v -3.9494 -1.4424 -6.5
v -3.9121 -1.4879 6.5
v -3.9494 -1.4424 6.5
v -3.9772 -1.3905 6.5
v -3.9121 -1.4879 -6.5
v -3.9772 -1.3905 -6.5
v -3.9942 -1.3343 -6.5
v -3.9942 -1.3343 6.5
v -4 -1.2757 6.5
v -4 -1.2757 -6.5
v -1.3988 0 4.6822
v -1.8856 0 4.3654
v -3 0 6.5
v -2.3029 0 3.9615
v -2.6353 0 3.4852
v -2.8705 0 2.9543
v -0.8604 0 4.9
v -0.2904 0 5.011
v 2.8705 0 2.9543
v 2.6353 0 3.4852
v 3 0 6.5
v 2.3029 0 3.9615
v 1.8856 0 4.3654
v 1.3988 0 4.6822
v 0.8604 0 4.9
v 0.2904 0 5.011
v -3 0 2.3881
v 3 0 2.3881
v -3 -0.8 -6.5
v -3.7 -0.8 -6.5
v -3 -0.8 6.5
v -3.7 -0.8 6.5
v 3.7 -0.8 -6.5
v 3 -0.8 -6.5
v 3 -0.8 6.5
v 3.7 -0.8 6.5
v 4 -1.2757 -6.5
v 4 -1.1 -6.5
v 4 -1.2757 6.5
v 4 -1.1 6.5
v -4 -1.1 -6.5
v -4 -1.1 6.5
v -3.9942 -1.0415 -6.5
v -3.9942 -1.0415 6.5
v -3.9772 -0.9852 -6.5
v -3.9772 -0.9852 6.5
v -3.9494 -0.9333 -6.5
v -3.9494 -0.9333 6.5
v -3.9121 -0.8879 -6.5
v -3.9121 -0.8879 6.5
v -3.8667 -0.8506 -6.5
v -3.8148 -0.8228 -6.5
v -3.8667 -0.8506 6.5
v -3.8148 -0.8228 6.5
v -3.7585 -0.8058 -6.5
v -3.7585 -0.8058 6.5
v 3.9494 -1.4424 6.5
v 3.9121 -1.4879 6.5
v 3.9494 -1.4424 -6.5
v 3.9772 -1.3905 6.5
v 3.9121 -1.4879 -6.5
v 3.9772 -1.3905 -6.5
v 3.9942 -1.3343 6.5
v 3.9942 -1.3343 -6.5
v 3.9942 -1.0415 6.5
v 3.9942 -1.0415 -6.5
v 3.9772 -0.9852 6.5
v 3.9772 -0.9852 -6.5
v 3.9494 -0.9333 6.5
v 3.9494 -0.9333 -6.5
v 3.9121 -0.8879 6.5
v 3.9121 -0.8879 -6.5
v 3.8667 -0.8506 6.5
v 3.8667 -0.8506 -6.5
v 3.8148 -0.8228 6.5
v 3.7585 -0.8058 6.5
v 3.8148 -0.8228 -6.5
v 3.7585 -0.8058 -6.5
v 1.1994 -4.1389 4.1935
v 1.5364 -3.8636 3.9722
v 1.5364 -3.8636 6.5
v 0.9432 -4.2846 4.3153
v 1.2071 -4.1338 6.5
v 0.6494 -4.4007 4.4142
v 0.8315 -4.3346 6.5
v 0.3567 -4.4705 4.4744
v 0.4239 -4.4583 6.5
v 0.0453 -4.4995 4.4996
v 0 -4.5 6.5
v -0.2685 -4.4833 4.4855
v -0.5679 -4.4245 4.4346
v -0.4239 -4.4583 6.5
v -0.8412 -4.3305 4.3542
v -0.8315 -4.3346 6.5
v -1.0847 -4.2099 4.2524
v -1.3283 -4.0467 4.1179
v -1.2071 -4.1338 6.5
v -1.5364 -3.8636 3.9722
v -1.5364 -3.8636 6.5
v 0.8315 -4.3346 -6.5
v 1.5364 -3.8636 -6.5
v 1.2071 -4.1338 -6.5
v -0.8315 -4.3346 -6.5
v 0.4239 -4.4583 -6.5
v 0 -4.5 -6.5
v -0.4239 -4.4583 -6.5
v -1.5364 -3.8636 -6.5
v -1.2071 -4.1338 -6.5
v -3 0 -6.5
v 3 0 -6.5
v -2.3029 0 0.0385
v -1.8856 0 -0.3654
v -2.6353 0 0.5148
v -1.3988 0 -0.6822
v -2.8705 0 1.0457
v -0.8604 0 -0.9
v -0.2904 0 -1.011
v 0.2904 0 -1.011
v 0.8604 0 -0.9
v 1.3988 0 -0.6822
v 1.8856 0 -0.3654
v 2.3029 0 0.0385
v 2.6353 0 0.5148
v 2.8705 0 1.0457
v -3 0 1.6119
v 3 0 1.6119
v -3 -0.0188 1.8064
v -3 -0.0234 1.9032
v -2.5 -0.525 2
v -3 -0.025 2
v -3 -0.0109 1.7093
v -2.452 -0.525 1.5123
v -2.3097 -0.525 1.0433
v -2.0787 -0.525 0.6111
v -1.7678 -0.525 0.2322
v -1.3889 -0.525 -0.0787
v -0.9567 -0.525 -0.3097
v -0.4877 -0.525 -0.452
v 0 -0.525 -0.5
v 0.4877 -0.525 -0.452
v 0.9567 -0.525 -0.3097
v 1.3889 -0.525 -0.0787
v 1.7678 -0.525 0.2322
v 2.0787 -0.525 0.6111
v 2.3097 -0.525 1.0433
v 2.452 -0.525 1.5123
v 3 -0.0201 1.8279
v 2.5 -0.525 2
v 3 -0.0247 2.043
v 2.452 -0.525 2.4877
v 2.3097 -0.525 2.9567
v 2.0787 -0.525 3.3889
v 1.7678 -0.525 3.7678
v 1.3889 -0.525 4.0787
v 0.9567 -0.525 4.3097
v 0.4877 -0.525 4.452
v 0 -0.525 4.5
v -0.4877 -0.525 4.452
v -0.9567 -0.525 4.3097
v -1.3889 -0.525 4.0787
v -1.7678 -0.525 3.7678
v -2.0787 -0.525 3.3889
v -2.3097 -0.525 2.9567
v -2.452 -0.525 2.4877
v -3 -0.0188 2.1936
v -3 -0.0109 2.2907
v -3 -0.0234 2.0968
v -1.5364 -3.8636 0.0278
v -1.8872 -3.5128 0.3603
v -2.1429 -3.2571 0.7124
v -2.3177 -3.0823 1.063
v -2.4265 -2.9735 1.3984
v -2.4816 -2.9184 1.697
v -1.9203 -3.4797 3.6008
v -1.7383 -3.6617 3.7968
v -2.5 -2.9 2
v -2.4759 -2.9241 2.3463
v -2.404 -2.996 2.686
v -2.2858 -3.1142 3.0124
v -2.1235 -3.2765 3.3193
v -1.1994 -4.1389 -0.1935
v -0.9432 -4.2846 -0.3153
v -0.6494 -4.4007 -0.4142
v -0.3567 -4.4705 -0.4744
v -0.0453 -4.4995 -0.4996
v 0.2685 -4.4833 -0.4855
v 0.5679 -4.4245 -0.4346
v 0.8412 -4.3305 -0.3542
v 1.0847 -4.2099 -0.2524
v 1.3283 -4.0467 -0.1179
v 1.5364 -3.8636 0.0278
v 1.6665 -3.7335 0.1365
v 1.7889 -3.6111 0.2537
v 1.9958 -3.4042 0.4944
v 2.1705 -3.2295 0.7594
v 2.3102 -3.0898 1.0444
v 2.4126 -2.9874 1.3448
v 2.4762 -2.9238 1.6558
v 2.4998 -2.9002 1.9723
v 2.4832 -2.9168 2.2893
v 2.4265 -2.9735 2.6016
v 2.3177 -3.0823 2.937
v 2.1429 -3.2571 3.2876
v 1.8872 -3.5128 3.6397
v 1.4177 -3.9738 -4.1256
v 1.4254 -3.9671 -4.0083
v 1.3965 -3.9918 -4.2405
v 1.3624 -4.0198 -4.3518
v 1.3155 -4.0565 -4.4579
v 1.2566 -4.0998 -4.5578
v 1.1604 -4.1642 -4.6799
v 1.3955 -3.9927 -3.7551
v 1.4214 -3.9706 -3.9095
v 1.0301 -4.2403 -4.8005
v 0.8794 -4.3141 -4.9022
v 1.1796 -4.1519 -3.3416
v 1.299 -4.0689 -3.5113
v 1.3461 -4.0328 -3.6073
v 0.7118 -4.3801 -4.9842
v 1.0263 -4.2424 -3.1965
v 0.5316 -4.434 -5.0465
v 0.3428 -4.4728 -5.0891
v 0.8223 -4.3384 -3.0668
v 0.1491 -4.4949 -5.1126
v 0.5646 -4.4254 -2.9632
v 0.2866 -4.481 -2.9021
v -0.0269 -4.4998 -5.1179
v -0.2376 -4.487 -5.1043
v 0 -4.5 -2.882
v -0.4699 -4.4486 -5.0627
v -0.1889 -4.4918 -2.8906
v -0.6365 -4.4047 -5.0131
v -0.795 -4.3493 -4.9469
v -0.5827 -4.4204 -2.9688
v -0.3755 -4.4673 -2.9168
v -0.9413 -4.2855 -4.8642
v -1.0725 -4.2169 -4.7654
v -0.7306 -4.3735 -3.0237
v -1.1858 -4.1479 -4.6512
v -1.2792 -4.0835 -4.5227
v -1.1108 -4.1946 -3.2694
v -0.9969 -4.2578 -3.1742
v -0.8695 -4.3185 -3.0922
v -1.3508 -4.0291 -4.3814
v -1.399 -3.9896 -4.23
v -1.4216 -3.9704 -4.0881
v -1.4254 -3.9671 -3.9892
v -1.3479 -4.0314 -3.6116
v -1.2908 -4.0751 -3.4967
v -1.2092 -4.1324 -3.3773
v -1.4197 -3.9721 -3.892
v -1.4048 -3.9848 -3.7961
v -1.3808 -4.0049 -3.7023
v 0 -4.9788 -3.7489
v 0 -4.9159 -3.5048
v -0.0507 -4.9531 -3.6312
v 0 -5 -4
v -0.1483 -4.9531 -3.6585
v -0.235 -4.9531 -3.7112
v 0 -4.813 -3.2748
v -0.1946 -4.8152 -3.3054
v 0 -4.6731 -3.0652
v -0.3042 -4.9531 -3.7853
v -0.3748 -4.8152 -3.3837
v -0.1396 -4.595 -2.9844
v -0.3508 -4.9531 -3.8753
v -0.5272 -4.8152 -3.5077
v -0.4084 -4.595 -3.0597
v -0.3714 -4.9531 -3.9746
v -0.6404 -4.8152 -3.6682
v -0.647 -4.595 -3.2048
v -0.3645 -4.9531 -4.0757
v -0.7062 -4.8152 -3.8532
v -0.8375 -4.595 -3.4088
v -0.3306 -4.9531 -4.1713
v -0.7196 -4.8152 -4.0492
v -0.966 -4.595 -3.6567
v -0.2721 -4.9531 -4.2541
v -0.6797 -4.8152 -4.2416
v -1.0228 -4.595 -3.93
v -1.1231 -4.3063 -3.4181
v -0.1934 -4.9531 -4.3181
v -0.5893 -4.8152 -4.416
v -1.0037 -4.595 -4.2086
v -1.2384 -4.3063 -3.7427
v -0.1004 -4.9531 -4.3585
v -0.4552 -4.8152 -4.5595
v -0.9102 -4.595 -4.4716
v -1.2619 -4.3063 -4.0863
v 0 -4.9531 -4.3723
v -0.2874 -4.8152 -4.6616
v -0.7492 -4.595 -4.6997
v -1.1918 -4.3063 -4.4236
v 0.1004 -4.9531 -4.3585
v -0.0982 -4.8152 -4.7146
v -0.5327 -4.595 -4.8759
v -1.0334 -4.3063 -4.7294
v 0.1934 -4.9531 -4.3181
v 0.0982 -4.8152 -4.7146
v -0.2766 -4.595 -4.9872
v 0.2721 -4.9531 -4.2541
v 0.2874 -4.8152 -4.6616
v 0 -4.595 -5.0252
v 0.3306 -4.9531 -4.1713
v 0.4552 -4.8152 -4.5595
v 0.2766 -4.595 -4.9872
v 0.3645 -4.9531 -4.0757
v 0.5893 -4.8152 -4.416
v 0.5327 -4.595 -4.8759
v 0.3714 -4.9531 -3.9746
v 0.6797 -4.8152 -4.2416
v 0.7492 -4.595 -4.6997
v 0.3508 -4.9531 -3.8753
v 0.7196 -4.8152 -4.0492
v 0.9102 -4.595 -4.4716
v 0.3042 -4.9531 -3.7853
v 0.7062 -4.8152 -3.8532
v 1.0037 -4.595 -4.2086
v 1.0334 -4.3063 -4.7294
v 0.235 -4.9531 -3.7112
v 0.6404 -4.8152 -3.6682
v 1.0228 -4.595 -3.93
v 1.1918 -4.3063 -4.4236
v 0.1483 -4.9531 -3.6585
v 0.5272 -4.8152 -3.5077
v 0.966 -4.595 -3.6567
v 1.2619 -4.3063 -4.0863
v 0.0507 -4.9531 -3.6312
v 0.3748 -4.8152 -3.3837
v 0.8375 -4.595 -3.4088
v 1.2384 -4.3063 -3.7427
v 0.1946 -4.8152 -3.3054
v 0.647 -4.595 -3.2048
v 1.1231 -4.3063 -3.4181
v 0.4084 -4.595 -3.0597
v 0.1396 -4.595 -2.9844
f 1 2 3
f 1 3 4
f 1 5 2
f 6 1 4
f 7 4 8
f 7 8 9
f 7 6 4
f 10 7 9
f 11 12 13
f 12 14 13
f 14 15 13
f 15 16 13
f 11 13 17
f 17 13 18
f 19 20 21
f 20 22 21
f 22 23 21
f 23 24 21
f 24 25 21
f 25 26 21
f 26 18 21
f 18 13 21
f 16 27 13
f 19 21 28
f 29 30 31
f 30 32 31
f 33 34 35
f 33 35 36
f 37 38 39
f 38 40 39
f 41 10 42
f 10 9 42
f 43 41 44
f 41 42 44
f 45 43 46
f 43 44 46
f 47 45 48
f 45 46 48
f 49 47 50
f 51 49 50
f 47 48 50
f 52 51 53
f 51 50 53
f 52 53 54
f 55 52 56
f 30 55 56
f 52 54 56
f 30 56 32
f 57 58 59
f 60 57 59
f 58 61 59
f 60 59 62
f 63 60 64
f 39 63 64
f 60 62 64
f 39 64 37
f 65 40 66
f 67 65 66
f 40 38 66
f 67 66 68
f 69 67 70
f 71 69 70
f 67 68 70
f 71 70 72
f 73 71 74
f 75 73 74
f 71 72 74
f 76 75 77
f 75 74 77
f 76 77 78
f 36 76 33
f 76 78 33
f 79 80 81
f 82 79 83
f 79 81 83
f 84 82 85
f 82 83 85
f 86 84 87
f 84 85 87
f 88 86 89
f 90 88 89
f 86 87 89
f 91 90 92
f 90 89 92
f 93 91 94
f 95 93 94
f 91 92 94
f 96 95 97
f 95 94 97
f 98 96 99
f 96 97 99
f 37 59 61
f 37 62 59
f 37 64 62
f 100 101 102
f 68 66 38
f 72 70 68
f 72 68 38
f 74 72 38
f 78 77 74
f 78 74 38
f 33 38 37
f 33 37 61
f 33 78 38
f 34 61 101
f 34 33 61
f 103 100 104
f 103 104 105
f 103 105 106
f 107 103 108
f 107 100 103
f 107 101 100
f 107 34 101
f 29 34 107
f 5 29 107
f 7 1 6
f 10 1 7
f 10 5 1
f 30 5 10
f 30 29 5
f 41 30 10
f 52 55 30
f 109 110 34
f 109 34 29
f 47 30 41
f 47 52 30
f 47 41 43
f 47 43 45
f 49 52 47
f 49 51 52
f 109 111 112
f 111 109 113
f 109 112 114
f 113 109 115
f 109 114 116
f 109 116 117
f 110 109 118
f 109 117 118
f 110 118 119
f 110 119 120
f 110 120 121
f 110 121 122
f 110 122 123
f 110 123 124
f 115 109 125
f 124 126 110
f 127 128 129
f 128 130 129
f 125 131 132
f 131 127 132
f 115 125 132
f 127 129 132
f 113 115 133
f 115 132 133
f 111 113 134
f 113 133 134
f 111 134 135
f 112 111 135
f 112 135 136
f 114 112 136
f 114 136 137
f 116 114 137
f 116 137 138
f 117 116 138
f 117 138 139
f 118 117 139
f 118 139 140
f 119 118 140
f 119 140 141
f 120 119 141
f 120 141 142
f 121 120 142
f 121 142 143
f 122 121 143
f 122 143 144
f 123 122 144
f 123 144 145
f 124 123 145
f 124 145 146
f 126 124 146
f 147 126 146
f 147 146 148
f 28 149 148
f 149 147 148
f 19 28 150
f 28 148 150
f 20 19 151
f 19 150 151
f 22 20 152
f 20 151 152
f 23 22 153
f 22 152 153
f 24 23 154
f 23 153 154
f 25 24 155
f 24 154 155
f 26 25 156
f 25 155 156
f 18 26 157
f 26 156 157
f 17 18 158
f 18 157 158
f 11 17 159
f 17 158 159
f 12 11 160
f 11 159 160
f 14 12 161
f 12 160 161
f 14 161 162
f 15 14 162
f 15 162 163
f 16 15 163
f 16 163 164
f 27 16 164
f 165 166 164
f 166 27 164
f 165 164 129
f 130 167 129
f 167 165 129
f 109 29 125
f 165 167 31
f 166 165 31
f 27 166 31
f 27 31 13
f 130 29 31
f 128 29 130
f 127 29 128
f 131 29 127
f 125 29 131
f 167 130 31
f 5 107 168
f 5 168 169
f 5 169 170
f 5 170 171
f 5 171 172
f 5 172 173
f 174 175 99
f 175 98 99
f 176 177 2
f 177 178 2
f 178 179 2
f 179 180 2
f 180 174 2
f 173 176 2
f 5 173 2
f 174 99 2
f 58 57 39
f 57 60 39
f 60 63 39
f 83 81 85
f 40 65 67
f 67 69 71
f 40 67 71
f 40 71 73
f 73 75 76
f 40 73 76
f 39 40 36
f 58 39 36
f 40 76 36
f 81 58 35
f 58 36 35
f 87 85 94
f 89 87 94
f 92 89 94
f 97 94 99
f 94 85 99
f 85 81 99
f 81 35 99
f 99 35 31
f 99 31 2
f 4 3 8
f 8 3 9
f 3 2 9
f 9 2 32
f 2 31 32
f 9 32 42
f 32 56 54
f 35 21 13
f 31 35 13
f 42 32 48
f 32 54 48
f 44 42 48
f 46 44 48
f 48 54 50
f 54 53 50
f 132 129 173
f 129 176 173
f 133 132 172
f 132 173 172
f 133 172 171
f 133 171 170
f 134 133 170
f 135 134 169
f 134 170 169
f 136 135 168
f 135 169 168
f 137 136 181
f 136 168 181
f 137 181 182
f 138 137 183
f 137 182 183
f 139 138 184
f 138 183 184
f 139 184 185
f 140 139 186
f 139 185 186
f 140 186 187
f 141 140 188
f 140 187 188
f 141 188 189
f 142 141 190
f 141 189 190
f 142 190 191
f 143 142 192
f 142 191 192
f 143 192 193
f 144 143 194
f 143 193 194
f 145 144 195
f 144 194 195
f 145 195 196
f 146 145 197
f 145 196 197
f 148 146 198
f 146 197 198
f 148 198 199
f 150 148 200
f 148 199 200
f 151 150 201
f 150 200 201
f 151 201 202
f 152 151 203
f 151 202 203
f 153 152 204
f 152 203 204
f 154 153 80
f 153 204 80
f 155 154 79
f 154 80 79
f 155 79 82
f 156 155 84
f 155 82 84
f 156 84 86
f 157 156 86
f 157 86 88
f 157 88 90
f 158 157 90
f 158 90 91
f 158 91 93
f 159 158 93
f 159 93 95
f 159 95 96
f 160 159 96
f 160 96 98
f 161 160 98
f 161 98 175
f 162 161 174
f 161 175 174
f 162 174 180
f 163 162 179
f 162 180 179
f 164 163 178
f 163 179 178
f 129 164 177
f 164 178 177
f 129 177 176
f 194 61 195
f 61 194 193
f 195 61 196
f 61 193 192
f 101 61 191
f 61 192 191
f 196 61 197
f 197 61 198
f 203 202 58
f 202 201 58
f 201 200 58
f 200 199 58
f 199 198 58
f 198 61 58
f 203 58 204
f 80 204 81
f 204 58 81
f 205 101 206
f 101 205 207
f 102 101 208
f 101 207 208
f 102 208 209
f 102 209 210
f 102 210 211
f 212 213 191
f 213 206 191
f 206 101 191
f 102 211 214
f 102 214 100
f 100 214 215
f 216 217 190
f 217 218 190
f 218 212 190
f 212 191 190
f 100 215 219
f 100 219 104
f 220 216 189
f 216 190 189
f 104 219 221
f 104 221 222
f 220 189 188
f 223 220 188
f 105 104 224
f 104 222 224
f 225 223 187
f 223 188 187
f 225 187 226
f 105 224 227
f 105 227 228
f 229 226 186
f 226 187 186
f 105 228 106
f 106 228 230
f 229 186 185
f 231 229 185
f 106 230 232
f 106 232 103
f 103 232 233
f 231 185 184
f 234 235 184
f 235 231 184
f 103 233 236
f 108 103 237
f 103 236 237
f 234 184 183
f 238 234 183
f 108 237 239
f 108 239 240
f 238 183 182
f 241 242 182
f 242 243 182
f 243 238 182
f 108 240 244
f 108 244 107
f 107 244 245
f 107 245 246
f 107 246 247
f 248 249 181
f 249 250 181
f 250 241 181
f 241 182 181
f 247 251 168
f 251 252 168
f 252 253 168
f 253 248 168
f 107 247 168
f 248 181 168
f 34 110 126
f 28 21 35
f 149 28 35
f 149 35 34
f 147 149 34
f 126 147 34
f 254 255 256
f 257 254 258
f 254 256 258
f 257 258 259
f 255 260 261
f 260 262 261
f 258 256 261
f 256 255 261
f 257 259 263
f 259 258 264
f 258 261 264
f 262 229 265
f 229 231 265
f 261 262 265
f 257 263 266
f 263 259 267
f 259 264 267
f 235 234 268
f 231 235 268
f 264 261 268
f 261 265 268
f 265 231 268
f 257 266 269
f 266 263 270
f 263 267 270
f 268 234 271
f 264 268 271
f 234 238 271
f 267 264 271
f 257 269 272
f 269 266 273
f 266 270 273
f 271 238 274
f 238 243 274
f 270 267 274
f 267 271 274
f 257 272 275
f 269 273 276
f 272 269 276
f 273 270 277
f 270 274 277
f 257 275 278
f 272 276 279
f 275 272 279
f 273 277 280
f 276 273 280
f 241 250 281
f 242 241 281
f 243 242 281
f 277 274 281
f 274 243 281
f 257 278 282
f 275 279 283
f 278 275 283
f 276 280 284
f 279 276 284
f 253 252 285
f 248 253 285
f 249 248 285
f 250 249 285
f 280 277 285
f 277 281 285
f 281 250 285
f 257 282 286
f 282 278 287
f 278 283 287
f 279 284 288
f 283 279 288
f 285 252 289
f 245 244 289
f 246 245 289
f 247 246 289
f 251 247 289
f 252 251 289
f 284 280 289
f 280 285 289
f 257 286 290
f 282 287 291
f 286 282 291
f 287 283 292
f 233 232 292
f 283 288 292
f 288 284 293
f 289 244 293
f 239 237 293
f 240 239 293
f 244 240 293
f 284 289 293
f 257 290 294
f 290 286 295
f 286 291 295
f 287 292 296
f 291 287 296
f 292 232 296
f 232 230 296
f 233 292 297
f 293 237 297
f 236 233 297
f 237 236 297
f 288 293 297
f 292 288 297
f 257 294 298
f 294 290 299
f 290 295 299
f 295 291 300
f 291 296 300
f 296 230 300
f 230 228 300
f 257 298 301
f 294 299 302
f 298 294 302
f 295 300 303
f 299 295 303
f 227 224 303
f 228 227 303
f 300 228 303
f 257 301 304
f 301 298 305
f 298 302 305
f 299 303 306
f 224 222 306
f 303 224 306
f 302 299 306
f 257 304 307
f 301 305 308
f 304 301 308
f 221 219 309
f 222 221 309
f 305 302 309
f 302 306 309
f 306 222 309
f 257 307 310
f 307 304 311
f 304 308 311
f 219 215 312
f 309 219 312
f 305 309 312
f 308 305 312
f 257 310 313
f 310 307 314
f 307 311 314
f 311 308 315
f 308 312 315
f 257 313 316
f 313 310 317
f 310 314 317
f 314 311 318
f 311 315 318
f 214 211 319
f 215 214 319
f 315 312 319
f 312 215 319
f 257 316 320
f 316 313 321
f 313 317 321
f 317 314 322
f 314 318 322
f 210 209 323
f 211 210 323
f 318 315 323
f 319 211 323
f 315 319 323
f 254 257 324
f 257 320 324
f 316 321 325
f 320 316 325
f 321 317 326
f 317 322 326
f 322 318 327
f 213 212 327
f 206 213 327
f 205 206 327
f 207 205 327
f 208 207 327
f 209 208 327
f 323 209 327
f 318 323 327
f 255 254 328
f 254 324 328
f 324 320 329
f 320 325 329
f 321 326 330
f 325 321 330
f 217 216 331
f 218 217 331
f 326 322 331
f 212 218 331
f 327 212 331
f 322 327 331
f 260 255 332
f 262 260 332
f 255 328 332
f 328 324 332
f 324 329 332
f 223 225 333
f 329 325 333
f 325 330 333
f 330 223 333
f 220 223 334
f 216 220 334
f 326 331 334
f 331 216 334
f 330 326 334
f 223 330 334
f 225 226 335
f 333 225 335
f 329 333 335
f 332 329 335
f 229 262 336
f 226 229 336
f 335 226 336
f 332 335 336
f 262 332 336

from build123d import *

# Parameters (mm, degrees)
EXTRUDE_1_DEPTH             = 6.5
HOLE_WIZARD_M61_D           = 5
HOLE_WIZARD_M61_CSINK_D     = 6.05
HOLE_WIZARD_M61_CSINK_ANGLE = 90
FILLET_1_R                  = 0.3


with BuildPart() as part:
    # Эскиз1 → Бобышка-Вытянуть1 (new body, symmetric)
    with BuildSketch(Plane.XY):
        with BuildLine():
            Line((-3, 0), (3, 0))
            Line((3, 0), (3, -0.8))
            Line((3, -0.8), (4, -0.8))
            Line((4, -0.8), (4, -1.4))
            Line((4, -1.4), (1.536396103, -3.863603897))
            ThreePointArc((1.536396103, -3.863603897), (0, -4.5), (-1.536396103, -3.863603897))
            Line((-1.536396103, -3.863603897), (-4, -1.4))
            Line((-4, -1.4), (-4, -0.8))
            Line((-4, -0.8), (-3, -0.8))
            Line((-3, -0.8), (-3, 0))
        make_face()
    extrude(amount=EXTRUDE_1_DEPTH, both=True)

    # Отверстие обработанное метчиком M61 (through all)
    with Locations(Plane(origin=(0, 0, 0), x_dir=(1, 0, 0), z_dir=(0, 1, 0))):
        with Locations((0, -2)):
            CounterSinkHole(HOLE_WIZARD_M61_D / 2, HOLE_WIZARD_M61_CSINK_D / 2, counter_sink_angle=HOLE_WIZARD_M61_CSINK_ANGLE)

    # Эскиз5 → Повернуть1 (revolve)
    with BuildSketch(Plane(origin=(0, 0, 0), x_dir=(0, 0, -1), z_dir=(1, 0, 0))):
        with BuildLine():
            Line((4, -2), (4, -5))
            ThreePointArc((4, -5), (2.5, -3.5), (4, -2))
        make_face()
    revolve(axis=Axis((0, -2, -4), (0, -1, 0)))

    # Скругление1
    fillet_1_edges = [part.edges().sort_by_distance(p)[0] for p in [
        (4, -0.8, 0),
        (4, -1.4, 0),
        (-4, -1.4, 0),
        (-4, -0.8, 0),
    ]]
    fillet(fillet_1_edges, radius=FILLET_1_R)


solid = part.part
